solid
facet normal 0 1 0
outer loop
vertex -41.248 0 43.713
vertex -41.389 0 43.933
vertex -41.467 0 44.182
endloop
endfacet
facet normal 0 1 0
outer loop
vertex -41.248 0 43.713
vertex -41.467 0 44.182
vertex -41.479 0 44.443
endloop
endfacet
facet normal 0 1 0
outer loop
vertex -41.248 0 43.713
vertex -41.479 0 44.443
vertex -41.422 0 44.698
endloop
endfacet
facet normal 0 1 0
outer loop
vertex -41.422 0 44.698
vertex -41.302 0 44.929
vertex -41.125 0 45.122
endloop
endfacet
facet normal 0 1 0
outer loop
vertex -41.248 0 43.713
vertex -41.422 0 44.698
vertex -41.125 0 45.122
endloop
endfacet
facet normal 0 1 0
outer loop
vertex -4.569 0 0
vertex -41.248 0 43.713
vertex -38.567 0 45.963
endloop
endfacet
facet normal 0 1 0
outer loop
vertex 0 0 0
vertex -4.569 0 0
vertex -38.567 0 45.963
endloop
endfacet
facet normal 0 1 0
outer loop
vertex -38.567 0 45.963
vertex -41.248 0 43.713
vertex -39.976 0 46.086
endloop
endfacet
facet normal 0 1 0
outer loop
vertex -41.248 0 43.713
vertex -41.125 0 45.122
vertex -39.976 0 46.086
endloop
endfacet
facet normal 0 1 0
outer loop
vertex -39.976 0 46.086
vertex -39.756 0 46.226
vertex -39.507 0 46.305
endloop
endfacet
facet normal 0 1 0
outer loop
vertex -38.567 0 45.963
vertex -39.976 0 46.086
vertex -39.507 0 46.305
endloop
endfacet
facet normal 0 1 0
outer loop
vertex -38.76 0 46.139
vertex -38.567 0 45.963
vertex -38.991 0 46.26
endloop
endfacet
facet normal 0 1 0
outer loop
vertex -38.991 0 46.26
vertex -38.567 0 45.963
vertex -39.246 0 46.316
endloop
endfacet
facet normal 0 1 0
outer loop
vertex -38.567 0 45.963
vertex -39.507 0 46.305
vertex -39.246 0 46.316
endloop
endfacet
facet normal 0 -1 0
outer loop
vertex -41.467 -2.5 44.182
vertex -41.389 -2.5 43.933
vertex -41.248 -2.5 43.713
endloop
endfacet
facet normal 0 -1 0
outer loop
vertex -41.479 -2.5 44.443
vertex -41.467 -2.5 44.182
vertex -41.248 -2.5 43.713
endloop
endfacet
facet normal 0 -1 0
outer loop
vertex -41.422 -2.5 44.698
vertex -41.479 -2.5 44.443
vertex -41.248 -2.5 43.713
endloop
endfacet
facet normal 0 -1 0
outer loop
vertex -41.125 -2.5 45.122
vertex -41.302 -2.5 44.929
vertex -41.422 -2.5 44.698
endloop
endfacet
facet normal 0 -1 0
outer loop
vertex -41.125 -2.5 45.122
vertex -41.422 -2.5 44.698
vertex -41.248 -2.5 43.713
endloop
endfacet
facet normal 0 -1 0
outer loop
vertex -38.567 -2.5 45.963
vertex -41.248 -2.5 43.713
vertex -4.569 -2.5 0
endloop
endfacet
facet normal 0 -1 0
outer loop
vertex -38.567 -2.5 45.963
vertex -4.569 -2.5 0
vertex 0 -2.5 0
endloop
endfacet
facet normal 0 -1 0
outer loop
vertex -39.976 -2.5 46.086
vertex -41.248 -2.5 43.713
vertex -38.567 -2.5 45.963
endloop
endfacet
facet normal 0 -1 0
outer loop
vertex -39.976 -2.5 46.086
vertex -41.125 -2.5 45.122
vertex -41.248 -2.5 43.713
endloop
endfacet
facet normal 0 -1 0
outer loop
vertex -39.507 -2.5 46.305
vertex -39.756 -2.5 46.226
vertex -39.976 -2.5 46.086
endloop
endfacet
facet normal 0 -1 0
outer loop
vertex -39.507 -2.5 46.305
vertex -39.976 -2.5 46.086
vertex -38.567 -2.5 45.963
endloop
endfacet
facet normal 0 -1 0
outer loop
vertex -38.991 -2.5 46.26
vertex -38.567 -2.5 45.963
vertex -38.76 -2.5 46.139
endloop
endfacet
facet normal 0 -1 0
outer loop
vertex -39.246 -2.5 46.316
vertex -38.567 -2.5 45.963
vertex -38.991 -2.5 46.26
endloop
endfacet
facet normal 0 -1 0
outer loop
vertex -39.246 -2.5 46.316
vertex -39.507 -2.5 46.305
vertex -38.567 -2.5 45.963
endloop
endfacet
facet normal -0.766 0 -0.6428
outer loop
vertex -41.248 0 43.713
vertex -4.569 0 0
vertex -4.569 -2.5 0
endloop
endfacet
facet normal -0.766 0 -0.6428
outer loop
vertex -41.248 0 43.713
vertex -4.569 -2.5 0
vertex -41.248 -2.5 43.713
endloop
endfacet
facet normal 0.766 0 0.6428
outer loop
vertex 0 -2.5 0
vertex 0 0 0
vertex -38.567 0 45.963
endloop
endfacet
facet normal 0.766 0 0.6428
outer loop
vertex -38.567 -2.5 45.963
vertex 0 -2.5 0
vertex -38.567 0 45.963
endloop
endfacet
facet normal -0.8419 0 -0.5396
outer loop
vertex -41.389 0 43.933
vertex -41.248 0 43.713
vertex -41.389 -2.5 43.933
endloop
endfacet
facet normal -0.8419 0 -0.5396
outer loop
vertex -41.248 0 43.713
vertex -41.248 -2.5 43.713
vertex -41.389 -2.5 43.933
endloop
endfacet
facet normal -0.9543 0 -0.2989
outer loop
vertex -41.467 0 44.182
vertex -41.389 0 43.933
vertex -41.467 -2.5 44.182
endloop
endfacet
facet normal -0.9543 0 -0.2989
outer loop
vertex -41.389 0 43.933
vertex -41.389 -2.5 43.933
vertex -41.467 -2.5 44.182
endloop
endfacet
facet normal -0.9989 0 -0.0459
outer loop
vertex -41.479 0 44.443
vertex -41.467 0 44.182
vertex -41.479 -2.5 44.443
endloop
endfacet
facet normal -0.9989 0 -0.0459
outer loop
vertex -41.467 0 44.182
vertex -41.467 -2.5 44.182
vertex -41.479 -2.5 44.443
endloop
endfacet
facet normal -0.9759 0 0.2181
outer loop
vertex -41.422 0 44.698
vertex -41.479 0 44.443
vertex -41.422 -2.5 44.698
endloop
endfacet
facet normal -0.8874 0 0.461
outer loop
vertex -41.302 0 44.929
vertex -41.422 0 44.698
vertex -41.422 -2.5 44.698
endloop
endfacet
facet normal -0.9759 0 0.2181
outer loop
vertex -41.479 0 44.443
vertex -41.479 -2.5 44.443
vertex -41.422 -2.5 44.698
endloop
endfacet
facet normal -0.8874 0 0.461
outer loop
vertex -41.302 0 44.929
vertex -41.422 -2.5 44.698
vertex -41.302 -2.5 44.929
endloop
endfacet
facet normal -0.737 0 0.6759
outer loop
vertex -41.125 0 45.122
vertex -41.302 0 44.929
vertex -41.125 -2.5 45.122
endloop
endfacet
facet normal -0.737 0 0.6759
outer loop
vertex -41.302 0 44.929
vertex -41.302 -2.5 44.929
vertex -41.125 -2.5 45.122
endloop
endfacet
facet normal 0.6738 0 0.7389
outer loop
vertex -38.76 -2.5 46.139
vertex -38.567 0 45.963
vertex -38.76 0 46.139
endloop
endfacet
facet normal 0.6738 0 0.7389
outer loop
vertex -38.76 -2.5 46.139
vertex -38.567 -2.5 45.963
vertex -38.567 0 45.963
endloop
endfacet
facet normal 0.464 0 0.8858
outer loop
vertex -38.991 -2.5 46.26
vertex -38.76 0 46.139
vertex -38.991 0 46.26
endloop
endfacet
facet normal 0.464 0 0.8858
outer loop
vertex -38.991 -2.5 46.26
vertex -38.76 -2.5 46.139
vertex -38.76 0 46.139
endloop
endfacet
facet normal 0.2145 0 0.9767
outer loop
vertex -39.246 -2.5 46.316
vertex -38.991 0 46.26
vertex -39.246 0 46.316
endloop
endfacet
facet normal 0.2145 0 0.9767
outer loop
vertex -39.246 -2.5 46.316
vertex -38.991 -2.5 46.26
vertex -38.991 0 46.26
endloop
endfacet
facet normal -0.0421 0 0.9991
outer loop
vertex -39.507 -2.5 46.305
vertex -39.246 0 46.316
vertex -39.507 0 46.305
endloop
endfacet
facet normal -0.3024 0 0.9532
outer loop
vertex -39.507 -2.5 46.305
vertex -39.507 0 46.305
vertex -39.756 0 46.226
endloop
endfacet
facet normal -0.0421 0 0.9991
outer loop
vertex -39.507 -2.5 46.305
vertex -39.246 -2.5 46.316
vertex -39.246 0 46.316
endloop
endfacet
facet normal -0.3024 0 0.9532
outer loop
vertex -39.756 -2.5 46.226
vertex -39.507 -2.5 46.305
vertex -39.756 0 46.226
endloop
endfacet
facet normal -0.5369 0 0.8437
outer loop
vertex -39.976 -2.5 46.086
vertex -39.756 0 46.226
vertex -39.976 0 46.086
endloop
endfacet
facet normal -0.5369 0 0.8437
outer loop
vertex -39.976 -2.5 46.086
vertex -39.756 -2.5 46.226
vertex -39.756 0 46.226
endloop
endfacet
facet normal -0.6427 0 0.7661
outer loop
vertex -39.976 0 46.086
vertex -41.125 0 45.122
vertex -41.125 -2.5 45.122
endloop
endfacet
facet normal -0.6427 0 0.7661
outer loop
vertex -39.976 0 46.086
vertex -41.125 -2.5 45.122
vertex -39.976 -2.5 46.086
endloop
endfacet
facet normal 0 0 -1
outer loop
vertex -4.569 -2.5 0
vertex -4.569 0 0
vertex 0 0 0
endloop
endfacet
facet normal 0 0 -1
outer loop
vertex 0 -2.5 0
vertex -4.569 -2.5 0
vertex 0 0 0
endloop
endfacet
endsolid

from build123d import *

# Parameters (mm, degrees)
F0_W     = 3.5
F0_H     = 61
F1_DEPTH = 2.5
F2_R     = 1
F3_ANGLE = -40
F4_W     = 59.4788547605
F4_H     = 9.7545320168
F5_DEPTH = 25


with BuildPart() as f1:
    # F0 (on Front) → F1 (new body)
    with BuildSketch(Plane.XZ):
        with Locations((-1.75, 30.5)):
            Rectangle(F0_W, F0_H)
    extrude(amount=F1_DEPTH)

    # F2
    f2_edges = [f1.edges().sort_by_distance(p)[0] for p in [
        (-3.5, -1.25, 61),
        (0, -1.25, 61),
    ]]
    fillet(f2_edges, radius=F2_R)


with BuildPart() as f1_1:
    # F3: moved
    add(f1.part.rotate(Axis((0, -1.25, 0), (0, 1, 0)), F3_ANGLE))


with BuildPart() as f5:
    # F4 (on Front) → F5 (new body)
    with BuildSketch(Plane.XZ):
        with Locations((-13.0853476003, -4.8772660084)):
            Rectangle(F4_W, F4_H)
    extrude(amount=F5_DEPTH)


with BuildPart() as f1_2:
    add(f1_1.part)

    # F6: cut F5
    add(f5.part, mode=Mode.SUBTRACT)


solid = f1_2.part
